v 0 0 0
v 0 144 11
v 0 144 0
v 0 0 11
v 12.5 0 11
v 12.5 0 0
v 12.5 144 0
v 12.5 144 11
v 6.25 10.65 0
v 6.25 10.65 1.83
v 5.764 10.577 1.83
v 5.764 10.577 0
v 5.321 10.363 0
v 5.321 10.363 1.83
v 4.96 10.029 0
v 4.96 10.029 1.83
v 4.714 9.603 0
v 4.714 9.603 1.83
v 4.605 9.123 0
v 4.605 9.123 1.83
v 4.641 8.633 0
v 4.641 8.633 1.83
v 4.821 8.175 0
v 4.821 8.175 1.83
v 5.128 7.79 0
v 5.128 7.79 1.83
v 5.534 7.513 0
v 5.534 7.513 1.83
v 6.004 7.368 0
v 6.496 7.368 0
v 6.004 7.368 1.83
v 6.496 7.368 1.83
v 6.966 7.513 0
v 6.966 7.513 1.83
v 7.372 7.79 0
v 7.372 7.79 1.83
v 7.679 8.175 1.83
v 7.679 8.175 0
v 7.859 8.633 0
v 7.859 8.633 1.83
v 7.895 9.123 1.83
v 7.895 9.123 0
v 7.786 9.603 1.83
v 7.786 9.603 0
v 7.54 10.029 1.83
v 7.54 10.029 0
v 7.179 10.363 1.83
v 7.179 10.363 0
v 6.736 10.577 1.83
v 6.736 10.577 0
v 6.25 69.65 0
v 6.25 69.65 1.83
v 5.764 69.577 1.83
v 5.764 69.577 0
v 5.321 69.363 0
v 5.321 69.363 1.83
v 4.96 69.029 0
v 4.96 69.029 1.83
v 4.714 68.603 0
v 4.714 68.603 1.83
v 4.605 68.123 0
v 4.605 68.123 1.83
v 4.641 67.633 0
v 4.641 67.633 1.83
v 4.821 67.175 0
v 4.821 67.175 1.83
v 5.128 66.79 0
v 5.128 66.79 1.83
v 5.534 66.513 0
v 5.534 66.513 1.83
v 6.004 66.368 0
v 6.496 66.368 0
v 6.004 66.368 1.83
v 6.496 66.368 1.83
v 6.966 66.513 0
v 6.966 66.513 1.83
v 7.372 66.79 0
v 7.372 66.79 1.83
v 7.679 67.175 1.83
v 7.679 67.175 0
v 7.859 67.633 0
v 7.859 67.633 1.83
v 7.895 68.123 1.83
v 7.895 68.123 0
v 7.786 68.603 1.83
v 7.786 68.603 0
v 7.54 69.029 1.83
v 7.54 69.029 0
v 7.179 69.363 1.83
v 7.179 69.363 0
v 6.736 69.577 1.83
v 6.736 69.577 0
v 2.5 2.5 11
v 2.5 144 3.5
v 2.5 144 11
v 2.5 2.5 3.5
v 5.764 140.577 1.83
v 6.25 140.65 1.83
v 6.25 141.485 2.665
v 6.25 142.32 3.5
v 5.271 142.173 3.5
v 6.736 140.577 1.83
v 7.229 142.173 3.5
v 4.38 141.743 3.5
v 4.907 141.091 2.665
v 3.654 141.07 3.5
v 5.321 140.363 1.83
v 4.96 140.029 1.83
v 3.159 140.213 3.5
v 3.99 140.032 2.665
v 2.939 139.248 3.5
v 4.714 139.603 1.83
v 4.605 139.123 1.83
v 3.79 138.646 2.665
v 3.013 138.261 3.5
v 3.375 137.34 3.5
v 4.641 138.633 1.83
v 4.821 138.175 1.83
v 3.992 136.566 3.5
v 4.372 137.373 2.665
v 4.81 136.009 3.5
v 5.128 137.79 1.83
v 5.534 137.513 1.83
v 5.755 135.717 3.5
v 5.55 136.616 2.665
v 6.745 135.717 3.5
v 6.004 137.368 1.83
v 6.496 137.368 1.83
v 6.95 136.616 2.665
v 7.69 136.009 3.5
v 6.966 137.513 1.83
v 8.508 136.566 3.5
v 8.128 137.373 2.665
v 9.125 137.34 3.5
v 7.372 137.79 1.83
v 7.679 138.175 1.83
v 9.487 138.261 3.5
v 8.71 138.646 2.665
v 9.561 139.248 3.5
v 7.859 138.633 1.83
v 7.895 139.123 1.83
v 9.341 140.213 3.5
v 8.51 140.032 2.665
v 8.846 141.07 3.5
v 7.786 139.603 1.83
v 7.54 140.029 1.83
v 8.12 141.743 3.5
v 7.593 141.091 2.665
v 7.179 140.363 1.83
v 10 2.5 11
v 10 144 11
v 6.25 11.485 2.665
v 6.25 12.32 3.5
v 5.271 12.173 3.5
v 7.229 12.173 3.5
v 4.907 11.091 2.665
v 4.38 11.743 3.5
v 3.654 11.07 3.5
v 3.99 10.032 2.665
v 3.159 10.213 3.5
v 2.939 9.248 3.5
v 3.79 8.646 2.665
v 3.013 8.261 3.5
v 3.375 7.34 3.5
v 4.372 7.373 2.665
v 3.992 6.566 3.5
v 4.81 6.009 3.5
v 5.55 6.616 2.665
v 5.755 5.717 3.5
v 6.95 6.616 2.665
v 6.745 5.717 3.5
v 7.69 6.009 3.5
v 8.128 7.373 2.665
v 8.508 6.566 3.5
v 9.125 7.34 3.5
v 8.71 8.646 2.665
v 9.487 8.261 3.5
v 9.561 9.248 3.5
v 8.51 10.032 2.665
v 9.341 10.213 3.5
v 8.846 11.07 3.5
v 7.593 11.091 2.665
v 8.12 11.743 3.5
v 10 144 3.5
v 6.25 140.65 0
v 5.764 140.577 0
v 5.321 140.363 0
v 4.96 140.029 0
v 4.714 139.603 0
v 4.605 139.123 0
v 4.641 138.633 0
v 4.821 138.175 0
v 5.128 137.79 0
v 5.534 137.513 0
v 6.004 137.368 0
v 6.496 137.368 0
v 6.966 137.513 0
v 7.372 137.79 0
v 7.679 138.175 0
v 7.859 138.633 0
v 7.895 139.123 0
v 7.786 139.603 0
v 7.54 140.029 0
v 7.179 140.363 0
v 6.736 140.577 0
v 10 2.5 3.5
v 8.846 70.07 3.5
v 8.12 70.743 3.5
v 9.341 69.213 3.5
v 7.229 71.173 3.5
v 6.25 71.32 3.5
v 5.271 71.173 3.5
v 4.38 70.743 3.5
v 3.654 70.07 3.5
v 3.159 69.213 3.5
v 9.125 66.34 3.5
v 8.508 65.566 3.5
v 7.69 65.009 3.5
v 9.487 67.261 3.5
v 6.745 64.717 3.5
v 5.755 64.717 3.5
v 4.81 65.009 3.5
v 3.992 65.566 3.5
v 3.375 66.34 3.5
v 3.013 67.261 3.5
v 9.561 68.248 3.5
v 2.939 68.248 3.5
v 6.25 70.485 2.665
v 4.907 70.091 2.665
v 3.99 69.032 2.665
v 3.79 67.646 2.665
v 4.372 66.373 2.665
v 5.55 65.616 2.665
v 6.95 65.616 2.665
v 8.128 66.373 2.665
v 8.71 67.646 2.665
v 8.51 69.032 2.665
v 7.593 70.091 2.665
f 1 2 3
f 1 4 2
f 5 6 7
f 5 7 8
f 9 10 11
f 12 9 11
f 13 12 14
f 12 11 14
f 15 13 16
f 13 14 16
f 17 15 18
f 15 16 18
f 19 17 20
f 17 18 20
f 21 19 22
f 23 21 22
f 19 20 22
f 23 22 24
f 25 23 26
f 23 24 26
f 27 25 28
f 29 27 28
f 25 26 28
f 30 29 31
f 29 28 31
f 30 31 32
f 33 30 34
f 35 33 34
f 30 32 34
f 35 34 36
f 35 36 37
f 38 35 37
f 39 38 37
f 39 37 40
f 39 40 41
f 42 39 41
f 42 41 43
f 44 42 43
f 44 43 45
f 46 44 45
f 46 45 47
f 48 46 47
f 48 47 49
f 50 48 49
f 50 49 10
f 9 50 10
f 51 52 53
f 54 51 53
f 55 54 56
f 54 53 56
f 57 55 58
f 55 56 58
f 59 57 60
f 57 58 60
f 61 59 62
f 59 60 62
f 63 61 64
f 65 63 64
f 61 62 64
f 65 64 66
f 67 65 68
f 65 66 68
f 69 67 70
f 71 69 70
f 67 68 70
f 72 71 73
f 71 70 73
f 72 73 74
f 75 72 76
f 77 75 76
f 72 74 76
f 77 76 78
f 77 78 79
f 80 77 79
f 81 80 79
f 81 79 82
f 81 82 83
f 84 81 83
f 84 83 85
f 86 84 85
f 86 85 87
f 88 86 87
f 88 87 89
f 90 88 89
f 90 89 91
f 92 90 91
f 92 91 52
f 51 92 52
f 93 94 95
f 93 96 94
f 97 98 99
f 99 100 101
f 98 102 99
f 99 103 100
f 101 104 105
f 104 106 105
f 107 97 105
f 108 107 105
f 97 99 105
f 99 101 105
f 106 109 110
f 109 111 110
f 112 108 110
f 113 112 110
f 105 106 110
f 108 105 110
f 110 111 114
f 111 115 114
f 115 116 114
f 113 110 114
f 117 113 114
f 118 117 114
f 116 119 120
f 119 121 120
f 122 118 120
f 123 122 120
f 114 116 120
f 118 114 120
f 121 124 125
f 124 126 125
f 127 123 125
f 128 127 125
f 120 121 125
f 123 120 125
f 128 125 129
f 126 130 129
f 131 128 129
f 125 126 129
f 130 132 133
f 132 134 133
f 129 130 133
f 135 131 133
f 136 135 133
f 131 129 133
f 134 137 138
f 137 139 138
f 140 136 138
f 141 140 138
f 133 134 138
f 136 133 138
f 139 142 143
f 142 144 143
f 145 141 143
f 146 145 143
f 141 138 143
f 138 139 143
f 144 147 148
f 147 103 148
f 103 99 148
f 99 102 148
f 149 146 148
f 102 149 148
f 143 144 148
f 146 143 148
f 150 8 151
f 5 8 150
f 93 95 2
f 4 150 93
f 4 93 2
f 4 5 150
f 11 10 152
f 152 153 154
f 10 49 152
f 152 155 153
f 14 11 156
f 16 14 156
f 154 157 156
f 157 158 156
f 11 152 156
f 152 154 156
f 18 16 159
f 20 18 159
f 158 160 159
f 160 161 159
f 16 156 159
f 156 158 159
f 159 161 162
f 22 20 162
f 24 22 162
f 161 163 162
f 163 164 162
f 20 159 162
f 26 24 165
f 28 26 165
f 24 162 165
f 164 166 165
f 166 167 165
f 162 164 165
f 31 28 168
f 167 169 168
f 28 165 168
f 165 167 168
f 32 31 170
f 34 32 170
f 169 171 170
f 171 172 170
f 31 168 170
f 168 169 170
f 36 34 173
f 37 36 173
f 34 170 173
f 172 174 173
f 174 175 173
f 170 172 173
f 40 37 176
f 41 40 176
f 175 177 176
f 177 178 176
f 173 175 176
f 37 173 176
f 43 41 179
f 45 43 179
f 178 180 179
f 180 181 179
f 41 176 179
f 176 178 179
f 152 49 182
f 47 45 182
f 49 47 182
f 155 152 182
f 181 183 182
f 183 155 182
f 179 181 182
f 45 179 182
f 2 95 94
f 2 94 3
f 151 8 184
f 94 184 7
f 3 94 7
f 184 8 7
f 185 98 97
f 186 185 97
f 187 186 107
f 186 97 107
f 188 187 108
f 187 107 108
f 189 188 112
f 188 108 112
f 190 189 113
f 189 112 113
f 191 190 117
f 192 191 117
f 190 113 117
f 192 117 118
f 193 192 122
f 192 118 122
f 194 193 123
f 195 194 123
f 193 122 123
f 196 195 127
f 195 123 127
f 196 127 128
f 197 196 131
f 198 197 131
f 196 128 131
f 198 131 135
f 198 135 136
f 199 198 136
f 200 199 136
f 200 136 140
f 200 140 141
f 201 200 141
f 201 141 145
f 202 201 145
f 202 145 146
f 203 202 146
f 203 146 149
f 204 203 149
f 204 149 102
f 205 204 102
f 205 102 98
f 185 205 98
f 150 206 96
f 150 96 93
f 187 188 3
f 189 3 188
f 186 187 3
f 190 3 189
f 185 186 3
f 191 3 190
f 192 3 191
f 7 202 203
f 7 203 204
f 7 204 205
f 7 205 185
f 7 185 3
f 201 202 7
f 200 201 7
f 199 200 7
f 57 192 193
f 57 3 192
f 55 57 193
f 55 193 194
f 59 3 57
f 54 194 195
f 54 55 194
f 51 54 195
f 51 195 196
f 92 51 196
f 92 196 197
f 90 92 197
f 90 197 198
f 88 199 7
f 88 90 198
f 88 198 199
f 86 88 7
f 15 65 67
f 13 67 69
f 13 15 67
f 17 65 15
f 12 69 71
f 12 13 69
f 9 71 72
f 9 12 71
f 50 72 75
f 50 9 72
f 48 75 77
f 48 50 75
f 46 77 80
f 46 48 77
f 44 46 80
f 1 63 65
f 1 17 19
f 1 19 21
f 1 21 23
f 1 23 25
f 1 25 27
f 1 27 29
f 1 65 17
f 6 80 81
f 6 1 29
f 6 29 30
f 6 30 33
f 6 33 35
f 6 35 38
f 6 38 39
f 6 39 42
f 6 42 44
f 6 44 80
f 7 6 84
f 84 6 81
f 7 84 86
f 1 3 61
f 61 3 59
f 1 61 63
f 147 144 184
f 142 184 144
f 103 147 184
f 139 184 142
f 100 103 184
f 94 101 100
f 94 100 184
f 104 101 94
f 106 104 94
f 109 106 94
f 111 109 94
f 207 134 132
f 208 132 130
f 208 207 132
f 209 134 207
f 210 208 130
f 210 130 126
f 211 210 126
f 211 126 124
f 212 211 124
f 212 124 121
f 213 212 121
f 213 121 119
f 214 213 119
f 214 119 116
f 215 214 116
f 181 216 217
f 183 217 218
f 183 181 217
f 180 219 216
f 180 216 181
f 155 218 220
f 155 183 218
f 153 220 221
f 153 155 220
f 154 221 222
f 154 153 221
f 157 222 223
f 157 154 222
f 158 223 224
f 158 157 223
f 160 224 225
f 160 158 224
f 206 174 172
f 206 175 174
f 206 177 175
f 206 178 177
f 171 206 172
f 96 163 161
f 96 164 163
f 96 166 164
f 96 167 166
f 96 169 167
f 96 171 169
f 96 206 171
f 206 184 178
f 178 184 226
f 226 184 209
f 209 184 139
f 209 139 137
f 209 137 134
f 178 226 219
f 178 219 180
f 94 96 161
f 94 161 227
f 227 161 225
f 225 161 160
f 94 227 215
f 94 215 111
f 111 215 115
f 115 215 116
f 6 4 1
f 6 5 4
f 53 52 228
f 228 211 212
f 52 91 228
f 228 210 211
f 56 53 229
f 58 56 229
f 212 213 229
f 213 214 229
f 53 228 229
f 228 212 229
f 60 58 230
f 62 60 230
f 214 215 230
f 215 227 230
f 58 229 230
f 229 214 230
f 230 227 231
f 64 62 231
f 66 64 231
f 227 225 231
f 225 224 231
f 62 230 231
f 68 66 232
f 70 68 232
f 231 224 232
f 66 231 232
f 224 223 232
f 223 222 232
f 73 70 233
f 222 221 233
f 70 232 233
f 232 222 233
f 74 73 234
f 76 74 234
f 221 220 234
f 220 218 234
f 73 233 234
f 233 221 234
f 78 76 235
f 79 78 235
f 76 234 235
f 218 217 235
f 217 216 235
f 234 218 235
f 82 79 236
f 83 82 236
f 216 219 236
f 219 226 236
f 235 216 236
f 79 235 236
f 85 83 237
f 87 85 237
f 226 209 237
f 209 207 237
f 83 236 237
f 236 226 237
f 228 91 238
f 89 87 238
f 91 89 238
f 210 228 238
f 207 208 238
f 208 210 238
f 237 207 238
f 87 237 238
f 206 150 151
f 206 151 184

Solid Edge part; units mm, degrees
sketch "Sketch1" plane through (0, 0, 0) normal (0, -1, 0) x (1, 0, 0)
  line L0 (12.5, 0) -> (12.5, 11)
  line L1 (12.5, 11) -> (10, 11)
  line L2 (10, 11) -> (10, 3.5)
  line L3 (10, 3.5) -> (2.5, 3.5)
  line L4 (2.5, 3.5) -> (2.5, 11)
  line L5 (2.5, 11) -> (0, 11)
  line L6 (0, 11) -> (0, 0)
  line L7 (0, 0) -> (12.5, 0)
extrude "Protrusion1" add sketch "Sketch1" against normal blind 144
sketch "Sketch2" plane through (6.25, 0, 5.5) normal (0, -1, 0) x (1, 0, 0)
  line L0 (-3.75, 5.5) -> (3.75, 5.5)
  line L1 (3.75, 5.5) -> (3.75, -2)
  line L2 (3.75, -2) -> (-3.75, -2)
  line L3 (-3.75, -2) -> (-3.75, 5.5)
extrude "ExtrudedProtrusion_2" add sketch "Sketch2" against normal blind 2.5
sketch "Sketch3" plane through (6.25, 77.25, 3.5) normal (0, 0, 1) x (0, 1, 0)
  circle A0 centre (-68.25, 0) radius 1.65
  circle A1 centre (-9.25, 0) radius 1.65
  circle A2 centre (61.75, 0) radius 1.65
  dimension "D1" = 5
  dimension "D2" = 59
  dimension "D3" = 6.5
extrude "Cutout1" cut sketch "Sketch3" against normal through all
chamfer "Countersink" distance 1.67 angle 45 3 edges at (6.25, 66.35, 3.5) (6.25, 7.35, 3.5) (6.25, 137.35, 3.5)
